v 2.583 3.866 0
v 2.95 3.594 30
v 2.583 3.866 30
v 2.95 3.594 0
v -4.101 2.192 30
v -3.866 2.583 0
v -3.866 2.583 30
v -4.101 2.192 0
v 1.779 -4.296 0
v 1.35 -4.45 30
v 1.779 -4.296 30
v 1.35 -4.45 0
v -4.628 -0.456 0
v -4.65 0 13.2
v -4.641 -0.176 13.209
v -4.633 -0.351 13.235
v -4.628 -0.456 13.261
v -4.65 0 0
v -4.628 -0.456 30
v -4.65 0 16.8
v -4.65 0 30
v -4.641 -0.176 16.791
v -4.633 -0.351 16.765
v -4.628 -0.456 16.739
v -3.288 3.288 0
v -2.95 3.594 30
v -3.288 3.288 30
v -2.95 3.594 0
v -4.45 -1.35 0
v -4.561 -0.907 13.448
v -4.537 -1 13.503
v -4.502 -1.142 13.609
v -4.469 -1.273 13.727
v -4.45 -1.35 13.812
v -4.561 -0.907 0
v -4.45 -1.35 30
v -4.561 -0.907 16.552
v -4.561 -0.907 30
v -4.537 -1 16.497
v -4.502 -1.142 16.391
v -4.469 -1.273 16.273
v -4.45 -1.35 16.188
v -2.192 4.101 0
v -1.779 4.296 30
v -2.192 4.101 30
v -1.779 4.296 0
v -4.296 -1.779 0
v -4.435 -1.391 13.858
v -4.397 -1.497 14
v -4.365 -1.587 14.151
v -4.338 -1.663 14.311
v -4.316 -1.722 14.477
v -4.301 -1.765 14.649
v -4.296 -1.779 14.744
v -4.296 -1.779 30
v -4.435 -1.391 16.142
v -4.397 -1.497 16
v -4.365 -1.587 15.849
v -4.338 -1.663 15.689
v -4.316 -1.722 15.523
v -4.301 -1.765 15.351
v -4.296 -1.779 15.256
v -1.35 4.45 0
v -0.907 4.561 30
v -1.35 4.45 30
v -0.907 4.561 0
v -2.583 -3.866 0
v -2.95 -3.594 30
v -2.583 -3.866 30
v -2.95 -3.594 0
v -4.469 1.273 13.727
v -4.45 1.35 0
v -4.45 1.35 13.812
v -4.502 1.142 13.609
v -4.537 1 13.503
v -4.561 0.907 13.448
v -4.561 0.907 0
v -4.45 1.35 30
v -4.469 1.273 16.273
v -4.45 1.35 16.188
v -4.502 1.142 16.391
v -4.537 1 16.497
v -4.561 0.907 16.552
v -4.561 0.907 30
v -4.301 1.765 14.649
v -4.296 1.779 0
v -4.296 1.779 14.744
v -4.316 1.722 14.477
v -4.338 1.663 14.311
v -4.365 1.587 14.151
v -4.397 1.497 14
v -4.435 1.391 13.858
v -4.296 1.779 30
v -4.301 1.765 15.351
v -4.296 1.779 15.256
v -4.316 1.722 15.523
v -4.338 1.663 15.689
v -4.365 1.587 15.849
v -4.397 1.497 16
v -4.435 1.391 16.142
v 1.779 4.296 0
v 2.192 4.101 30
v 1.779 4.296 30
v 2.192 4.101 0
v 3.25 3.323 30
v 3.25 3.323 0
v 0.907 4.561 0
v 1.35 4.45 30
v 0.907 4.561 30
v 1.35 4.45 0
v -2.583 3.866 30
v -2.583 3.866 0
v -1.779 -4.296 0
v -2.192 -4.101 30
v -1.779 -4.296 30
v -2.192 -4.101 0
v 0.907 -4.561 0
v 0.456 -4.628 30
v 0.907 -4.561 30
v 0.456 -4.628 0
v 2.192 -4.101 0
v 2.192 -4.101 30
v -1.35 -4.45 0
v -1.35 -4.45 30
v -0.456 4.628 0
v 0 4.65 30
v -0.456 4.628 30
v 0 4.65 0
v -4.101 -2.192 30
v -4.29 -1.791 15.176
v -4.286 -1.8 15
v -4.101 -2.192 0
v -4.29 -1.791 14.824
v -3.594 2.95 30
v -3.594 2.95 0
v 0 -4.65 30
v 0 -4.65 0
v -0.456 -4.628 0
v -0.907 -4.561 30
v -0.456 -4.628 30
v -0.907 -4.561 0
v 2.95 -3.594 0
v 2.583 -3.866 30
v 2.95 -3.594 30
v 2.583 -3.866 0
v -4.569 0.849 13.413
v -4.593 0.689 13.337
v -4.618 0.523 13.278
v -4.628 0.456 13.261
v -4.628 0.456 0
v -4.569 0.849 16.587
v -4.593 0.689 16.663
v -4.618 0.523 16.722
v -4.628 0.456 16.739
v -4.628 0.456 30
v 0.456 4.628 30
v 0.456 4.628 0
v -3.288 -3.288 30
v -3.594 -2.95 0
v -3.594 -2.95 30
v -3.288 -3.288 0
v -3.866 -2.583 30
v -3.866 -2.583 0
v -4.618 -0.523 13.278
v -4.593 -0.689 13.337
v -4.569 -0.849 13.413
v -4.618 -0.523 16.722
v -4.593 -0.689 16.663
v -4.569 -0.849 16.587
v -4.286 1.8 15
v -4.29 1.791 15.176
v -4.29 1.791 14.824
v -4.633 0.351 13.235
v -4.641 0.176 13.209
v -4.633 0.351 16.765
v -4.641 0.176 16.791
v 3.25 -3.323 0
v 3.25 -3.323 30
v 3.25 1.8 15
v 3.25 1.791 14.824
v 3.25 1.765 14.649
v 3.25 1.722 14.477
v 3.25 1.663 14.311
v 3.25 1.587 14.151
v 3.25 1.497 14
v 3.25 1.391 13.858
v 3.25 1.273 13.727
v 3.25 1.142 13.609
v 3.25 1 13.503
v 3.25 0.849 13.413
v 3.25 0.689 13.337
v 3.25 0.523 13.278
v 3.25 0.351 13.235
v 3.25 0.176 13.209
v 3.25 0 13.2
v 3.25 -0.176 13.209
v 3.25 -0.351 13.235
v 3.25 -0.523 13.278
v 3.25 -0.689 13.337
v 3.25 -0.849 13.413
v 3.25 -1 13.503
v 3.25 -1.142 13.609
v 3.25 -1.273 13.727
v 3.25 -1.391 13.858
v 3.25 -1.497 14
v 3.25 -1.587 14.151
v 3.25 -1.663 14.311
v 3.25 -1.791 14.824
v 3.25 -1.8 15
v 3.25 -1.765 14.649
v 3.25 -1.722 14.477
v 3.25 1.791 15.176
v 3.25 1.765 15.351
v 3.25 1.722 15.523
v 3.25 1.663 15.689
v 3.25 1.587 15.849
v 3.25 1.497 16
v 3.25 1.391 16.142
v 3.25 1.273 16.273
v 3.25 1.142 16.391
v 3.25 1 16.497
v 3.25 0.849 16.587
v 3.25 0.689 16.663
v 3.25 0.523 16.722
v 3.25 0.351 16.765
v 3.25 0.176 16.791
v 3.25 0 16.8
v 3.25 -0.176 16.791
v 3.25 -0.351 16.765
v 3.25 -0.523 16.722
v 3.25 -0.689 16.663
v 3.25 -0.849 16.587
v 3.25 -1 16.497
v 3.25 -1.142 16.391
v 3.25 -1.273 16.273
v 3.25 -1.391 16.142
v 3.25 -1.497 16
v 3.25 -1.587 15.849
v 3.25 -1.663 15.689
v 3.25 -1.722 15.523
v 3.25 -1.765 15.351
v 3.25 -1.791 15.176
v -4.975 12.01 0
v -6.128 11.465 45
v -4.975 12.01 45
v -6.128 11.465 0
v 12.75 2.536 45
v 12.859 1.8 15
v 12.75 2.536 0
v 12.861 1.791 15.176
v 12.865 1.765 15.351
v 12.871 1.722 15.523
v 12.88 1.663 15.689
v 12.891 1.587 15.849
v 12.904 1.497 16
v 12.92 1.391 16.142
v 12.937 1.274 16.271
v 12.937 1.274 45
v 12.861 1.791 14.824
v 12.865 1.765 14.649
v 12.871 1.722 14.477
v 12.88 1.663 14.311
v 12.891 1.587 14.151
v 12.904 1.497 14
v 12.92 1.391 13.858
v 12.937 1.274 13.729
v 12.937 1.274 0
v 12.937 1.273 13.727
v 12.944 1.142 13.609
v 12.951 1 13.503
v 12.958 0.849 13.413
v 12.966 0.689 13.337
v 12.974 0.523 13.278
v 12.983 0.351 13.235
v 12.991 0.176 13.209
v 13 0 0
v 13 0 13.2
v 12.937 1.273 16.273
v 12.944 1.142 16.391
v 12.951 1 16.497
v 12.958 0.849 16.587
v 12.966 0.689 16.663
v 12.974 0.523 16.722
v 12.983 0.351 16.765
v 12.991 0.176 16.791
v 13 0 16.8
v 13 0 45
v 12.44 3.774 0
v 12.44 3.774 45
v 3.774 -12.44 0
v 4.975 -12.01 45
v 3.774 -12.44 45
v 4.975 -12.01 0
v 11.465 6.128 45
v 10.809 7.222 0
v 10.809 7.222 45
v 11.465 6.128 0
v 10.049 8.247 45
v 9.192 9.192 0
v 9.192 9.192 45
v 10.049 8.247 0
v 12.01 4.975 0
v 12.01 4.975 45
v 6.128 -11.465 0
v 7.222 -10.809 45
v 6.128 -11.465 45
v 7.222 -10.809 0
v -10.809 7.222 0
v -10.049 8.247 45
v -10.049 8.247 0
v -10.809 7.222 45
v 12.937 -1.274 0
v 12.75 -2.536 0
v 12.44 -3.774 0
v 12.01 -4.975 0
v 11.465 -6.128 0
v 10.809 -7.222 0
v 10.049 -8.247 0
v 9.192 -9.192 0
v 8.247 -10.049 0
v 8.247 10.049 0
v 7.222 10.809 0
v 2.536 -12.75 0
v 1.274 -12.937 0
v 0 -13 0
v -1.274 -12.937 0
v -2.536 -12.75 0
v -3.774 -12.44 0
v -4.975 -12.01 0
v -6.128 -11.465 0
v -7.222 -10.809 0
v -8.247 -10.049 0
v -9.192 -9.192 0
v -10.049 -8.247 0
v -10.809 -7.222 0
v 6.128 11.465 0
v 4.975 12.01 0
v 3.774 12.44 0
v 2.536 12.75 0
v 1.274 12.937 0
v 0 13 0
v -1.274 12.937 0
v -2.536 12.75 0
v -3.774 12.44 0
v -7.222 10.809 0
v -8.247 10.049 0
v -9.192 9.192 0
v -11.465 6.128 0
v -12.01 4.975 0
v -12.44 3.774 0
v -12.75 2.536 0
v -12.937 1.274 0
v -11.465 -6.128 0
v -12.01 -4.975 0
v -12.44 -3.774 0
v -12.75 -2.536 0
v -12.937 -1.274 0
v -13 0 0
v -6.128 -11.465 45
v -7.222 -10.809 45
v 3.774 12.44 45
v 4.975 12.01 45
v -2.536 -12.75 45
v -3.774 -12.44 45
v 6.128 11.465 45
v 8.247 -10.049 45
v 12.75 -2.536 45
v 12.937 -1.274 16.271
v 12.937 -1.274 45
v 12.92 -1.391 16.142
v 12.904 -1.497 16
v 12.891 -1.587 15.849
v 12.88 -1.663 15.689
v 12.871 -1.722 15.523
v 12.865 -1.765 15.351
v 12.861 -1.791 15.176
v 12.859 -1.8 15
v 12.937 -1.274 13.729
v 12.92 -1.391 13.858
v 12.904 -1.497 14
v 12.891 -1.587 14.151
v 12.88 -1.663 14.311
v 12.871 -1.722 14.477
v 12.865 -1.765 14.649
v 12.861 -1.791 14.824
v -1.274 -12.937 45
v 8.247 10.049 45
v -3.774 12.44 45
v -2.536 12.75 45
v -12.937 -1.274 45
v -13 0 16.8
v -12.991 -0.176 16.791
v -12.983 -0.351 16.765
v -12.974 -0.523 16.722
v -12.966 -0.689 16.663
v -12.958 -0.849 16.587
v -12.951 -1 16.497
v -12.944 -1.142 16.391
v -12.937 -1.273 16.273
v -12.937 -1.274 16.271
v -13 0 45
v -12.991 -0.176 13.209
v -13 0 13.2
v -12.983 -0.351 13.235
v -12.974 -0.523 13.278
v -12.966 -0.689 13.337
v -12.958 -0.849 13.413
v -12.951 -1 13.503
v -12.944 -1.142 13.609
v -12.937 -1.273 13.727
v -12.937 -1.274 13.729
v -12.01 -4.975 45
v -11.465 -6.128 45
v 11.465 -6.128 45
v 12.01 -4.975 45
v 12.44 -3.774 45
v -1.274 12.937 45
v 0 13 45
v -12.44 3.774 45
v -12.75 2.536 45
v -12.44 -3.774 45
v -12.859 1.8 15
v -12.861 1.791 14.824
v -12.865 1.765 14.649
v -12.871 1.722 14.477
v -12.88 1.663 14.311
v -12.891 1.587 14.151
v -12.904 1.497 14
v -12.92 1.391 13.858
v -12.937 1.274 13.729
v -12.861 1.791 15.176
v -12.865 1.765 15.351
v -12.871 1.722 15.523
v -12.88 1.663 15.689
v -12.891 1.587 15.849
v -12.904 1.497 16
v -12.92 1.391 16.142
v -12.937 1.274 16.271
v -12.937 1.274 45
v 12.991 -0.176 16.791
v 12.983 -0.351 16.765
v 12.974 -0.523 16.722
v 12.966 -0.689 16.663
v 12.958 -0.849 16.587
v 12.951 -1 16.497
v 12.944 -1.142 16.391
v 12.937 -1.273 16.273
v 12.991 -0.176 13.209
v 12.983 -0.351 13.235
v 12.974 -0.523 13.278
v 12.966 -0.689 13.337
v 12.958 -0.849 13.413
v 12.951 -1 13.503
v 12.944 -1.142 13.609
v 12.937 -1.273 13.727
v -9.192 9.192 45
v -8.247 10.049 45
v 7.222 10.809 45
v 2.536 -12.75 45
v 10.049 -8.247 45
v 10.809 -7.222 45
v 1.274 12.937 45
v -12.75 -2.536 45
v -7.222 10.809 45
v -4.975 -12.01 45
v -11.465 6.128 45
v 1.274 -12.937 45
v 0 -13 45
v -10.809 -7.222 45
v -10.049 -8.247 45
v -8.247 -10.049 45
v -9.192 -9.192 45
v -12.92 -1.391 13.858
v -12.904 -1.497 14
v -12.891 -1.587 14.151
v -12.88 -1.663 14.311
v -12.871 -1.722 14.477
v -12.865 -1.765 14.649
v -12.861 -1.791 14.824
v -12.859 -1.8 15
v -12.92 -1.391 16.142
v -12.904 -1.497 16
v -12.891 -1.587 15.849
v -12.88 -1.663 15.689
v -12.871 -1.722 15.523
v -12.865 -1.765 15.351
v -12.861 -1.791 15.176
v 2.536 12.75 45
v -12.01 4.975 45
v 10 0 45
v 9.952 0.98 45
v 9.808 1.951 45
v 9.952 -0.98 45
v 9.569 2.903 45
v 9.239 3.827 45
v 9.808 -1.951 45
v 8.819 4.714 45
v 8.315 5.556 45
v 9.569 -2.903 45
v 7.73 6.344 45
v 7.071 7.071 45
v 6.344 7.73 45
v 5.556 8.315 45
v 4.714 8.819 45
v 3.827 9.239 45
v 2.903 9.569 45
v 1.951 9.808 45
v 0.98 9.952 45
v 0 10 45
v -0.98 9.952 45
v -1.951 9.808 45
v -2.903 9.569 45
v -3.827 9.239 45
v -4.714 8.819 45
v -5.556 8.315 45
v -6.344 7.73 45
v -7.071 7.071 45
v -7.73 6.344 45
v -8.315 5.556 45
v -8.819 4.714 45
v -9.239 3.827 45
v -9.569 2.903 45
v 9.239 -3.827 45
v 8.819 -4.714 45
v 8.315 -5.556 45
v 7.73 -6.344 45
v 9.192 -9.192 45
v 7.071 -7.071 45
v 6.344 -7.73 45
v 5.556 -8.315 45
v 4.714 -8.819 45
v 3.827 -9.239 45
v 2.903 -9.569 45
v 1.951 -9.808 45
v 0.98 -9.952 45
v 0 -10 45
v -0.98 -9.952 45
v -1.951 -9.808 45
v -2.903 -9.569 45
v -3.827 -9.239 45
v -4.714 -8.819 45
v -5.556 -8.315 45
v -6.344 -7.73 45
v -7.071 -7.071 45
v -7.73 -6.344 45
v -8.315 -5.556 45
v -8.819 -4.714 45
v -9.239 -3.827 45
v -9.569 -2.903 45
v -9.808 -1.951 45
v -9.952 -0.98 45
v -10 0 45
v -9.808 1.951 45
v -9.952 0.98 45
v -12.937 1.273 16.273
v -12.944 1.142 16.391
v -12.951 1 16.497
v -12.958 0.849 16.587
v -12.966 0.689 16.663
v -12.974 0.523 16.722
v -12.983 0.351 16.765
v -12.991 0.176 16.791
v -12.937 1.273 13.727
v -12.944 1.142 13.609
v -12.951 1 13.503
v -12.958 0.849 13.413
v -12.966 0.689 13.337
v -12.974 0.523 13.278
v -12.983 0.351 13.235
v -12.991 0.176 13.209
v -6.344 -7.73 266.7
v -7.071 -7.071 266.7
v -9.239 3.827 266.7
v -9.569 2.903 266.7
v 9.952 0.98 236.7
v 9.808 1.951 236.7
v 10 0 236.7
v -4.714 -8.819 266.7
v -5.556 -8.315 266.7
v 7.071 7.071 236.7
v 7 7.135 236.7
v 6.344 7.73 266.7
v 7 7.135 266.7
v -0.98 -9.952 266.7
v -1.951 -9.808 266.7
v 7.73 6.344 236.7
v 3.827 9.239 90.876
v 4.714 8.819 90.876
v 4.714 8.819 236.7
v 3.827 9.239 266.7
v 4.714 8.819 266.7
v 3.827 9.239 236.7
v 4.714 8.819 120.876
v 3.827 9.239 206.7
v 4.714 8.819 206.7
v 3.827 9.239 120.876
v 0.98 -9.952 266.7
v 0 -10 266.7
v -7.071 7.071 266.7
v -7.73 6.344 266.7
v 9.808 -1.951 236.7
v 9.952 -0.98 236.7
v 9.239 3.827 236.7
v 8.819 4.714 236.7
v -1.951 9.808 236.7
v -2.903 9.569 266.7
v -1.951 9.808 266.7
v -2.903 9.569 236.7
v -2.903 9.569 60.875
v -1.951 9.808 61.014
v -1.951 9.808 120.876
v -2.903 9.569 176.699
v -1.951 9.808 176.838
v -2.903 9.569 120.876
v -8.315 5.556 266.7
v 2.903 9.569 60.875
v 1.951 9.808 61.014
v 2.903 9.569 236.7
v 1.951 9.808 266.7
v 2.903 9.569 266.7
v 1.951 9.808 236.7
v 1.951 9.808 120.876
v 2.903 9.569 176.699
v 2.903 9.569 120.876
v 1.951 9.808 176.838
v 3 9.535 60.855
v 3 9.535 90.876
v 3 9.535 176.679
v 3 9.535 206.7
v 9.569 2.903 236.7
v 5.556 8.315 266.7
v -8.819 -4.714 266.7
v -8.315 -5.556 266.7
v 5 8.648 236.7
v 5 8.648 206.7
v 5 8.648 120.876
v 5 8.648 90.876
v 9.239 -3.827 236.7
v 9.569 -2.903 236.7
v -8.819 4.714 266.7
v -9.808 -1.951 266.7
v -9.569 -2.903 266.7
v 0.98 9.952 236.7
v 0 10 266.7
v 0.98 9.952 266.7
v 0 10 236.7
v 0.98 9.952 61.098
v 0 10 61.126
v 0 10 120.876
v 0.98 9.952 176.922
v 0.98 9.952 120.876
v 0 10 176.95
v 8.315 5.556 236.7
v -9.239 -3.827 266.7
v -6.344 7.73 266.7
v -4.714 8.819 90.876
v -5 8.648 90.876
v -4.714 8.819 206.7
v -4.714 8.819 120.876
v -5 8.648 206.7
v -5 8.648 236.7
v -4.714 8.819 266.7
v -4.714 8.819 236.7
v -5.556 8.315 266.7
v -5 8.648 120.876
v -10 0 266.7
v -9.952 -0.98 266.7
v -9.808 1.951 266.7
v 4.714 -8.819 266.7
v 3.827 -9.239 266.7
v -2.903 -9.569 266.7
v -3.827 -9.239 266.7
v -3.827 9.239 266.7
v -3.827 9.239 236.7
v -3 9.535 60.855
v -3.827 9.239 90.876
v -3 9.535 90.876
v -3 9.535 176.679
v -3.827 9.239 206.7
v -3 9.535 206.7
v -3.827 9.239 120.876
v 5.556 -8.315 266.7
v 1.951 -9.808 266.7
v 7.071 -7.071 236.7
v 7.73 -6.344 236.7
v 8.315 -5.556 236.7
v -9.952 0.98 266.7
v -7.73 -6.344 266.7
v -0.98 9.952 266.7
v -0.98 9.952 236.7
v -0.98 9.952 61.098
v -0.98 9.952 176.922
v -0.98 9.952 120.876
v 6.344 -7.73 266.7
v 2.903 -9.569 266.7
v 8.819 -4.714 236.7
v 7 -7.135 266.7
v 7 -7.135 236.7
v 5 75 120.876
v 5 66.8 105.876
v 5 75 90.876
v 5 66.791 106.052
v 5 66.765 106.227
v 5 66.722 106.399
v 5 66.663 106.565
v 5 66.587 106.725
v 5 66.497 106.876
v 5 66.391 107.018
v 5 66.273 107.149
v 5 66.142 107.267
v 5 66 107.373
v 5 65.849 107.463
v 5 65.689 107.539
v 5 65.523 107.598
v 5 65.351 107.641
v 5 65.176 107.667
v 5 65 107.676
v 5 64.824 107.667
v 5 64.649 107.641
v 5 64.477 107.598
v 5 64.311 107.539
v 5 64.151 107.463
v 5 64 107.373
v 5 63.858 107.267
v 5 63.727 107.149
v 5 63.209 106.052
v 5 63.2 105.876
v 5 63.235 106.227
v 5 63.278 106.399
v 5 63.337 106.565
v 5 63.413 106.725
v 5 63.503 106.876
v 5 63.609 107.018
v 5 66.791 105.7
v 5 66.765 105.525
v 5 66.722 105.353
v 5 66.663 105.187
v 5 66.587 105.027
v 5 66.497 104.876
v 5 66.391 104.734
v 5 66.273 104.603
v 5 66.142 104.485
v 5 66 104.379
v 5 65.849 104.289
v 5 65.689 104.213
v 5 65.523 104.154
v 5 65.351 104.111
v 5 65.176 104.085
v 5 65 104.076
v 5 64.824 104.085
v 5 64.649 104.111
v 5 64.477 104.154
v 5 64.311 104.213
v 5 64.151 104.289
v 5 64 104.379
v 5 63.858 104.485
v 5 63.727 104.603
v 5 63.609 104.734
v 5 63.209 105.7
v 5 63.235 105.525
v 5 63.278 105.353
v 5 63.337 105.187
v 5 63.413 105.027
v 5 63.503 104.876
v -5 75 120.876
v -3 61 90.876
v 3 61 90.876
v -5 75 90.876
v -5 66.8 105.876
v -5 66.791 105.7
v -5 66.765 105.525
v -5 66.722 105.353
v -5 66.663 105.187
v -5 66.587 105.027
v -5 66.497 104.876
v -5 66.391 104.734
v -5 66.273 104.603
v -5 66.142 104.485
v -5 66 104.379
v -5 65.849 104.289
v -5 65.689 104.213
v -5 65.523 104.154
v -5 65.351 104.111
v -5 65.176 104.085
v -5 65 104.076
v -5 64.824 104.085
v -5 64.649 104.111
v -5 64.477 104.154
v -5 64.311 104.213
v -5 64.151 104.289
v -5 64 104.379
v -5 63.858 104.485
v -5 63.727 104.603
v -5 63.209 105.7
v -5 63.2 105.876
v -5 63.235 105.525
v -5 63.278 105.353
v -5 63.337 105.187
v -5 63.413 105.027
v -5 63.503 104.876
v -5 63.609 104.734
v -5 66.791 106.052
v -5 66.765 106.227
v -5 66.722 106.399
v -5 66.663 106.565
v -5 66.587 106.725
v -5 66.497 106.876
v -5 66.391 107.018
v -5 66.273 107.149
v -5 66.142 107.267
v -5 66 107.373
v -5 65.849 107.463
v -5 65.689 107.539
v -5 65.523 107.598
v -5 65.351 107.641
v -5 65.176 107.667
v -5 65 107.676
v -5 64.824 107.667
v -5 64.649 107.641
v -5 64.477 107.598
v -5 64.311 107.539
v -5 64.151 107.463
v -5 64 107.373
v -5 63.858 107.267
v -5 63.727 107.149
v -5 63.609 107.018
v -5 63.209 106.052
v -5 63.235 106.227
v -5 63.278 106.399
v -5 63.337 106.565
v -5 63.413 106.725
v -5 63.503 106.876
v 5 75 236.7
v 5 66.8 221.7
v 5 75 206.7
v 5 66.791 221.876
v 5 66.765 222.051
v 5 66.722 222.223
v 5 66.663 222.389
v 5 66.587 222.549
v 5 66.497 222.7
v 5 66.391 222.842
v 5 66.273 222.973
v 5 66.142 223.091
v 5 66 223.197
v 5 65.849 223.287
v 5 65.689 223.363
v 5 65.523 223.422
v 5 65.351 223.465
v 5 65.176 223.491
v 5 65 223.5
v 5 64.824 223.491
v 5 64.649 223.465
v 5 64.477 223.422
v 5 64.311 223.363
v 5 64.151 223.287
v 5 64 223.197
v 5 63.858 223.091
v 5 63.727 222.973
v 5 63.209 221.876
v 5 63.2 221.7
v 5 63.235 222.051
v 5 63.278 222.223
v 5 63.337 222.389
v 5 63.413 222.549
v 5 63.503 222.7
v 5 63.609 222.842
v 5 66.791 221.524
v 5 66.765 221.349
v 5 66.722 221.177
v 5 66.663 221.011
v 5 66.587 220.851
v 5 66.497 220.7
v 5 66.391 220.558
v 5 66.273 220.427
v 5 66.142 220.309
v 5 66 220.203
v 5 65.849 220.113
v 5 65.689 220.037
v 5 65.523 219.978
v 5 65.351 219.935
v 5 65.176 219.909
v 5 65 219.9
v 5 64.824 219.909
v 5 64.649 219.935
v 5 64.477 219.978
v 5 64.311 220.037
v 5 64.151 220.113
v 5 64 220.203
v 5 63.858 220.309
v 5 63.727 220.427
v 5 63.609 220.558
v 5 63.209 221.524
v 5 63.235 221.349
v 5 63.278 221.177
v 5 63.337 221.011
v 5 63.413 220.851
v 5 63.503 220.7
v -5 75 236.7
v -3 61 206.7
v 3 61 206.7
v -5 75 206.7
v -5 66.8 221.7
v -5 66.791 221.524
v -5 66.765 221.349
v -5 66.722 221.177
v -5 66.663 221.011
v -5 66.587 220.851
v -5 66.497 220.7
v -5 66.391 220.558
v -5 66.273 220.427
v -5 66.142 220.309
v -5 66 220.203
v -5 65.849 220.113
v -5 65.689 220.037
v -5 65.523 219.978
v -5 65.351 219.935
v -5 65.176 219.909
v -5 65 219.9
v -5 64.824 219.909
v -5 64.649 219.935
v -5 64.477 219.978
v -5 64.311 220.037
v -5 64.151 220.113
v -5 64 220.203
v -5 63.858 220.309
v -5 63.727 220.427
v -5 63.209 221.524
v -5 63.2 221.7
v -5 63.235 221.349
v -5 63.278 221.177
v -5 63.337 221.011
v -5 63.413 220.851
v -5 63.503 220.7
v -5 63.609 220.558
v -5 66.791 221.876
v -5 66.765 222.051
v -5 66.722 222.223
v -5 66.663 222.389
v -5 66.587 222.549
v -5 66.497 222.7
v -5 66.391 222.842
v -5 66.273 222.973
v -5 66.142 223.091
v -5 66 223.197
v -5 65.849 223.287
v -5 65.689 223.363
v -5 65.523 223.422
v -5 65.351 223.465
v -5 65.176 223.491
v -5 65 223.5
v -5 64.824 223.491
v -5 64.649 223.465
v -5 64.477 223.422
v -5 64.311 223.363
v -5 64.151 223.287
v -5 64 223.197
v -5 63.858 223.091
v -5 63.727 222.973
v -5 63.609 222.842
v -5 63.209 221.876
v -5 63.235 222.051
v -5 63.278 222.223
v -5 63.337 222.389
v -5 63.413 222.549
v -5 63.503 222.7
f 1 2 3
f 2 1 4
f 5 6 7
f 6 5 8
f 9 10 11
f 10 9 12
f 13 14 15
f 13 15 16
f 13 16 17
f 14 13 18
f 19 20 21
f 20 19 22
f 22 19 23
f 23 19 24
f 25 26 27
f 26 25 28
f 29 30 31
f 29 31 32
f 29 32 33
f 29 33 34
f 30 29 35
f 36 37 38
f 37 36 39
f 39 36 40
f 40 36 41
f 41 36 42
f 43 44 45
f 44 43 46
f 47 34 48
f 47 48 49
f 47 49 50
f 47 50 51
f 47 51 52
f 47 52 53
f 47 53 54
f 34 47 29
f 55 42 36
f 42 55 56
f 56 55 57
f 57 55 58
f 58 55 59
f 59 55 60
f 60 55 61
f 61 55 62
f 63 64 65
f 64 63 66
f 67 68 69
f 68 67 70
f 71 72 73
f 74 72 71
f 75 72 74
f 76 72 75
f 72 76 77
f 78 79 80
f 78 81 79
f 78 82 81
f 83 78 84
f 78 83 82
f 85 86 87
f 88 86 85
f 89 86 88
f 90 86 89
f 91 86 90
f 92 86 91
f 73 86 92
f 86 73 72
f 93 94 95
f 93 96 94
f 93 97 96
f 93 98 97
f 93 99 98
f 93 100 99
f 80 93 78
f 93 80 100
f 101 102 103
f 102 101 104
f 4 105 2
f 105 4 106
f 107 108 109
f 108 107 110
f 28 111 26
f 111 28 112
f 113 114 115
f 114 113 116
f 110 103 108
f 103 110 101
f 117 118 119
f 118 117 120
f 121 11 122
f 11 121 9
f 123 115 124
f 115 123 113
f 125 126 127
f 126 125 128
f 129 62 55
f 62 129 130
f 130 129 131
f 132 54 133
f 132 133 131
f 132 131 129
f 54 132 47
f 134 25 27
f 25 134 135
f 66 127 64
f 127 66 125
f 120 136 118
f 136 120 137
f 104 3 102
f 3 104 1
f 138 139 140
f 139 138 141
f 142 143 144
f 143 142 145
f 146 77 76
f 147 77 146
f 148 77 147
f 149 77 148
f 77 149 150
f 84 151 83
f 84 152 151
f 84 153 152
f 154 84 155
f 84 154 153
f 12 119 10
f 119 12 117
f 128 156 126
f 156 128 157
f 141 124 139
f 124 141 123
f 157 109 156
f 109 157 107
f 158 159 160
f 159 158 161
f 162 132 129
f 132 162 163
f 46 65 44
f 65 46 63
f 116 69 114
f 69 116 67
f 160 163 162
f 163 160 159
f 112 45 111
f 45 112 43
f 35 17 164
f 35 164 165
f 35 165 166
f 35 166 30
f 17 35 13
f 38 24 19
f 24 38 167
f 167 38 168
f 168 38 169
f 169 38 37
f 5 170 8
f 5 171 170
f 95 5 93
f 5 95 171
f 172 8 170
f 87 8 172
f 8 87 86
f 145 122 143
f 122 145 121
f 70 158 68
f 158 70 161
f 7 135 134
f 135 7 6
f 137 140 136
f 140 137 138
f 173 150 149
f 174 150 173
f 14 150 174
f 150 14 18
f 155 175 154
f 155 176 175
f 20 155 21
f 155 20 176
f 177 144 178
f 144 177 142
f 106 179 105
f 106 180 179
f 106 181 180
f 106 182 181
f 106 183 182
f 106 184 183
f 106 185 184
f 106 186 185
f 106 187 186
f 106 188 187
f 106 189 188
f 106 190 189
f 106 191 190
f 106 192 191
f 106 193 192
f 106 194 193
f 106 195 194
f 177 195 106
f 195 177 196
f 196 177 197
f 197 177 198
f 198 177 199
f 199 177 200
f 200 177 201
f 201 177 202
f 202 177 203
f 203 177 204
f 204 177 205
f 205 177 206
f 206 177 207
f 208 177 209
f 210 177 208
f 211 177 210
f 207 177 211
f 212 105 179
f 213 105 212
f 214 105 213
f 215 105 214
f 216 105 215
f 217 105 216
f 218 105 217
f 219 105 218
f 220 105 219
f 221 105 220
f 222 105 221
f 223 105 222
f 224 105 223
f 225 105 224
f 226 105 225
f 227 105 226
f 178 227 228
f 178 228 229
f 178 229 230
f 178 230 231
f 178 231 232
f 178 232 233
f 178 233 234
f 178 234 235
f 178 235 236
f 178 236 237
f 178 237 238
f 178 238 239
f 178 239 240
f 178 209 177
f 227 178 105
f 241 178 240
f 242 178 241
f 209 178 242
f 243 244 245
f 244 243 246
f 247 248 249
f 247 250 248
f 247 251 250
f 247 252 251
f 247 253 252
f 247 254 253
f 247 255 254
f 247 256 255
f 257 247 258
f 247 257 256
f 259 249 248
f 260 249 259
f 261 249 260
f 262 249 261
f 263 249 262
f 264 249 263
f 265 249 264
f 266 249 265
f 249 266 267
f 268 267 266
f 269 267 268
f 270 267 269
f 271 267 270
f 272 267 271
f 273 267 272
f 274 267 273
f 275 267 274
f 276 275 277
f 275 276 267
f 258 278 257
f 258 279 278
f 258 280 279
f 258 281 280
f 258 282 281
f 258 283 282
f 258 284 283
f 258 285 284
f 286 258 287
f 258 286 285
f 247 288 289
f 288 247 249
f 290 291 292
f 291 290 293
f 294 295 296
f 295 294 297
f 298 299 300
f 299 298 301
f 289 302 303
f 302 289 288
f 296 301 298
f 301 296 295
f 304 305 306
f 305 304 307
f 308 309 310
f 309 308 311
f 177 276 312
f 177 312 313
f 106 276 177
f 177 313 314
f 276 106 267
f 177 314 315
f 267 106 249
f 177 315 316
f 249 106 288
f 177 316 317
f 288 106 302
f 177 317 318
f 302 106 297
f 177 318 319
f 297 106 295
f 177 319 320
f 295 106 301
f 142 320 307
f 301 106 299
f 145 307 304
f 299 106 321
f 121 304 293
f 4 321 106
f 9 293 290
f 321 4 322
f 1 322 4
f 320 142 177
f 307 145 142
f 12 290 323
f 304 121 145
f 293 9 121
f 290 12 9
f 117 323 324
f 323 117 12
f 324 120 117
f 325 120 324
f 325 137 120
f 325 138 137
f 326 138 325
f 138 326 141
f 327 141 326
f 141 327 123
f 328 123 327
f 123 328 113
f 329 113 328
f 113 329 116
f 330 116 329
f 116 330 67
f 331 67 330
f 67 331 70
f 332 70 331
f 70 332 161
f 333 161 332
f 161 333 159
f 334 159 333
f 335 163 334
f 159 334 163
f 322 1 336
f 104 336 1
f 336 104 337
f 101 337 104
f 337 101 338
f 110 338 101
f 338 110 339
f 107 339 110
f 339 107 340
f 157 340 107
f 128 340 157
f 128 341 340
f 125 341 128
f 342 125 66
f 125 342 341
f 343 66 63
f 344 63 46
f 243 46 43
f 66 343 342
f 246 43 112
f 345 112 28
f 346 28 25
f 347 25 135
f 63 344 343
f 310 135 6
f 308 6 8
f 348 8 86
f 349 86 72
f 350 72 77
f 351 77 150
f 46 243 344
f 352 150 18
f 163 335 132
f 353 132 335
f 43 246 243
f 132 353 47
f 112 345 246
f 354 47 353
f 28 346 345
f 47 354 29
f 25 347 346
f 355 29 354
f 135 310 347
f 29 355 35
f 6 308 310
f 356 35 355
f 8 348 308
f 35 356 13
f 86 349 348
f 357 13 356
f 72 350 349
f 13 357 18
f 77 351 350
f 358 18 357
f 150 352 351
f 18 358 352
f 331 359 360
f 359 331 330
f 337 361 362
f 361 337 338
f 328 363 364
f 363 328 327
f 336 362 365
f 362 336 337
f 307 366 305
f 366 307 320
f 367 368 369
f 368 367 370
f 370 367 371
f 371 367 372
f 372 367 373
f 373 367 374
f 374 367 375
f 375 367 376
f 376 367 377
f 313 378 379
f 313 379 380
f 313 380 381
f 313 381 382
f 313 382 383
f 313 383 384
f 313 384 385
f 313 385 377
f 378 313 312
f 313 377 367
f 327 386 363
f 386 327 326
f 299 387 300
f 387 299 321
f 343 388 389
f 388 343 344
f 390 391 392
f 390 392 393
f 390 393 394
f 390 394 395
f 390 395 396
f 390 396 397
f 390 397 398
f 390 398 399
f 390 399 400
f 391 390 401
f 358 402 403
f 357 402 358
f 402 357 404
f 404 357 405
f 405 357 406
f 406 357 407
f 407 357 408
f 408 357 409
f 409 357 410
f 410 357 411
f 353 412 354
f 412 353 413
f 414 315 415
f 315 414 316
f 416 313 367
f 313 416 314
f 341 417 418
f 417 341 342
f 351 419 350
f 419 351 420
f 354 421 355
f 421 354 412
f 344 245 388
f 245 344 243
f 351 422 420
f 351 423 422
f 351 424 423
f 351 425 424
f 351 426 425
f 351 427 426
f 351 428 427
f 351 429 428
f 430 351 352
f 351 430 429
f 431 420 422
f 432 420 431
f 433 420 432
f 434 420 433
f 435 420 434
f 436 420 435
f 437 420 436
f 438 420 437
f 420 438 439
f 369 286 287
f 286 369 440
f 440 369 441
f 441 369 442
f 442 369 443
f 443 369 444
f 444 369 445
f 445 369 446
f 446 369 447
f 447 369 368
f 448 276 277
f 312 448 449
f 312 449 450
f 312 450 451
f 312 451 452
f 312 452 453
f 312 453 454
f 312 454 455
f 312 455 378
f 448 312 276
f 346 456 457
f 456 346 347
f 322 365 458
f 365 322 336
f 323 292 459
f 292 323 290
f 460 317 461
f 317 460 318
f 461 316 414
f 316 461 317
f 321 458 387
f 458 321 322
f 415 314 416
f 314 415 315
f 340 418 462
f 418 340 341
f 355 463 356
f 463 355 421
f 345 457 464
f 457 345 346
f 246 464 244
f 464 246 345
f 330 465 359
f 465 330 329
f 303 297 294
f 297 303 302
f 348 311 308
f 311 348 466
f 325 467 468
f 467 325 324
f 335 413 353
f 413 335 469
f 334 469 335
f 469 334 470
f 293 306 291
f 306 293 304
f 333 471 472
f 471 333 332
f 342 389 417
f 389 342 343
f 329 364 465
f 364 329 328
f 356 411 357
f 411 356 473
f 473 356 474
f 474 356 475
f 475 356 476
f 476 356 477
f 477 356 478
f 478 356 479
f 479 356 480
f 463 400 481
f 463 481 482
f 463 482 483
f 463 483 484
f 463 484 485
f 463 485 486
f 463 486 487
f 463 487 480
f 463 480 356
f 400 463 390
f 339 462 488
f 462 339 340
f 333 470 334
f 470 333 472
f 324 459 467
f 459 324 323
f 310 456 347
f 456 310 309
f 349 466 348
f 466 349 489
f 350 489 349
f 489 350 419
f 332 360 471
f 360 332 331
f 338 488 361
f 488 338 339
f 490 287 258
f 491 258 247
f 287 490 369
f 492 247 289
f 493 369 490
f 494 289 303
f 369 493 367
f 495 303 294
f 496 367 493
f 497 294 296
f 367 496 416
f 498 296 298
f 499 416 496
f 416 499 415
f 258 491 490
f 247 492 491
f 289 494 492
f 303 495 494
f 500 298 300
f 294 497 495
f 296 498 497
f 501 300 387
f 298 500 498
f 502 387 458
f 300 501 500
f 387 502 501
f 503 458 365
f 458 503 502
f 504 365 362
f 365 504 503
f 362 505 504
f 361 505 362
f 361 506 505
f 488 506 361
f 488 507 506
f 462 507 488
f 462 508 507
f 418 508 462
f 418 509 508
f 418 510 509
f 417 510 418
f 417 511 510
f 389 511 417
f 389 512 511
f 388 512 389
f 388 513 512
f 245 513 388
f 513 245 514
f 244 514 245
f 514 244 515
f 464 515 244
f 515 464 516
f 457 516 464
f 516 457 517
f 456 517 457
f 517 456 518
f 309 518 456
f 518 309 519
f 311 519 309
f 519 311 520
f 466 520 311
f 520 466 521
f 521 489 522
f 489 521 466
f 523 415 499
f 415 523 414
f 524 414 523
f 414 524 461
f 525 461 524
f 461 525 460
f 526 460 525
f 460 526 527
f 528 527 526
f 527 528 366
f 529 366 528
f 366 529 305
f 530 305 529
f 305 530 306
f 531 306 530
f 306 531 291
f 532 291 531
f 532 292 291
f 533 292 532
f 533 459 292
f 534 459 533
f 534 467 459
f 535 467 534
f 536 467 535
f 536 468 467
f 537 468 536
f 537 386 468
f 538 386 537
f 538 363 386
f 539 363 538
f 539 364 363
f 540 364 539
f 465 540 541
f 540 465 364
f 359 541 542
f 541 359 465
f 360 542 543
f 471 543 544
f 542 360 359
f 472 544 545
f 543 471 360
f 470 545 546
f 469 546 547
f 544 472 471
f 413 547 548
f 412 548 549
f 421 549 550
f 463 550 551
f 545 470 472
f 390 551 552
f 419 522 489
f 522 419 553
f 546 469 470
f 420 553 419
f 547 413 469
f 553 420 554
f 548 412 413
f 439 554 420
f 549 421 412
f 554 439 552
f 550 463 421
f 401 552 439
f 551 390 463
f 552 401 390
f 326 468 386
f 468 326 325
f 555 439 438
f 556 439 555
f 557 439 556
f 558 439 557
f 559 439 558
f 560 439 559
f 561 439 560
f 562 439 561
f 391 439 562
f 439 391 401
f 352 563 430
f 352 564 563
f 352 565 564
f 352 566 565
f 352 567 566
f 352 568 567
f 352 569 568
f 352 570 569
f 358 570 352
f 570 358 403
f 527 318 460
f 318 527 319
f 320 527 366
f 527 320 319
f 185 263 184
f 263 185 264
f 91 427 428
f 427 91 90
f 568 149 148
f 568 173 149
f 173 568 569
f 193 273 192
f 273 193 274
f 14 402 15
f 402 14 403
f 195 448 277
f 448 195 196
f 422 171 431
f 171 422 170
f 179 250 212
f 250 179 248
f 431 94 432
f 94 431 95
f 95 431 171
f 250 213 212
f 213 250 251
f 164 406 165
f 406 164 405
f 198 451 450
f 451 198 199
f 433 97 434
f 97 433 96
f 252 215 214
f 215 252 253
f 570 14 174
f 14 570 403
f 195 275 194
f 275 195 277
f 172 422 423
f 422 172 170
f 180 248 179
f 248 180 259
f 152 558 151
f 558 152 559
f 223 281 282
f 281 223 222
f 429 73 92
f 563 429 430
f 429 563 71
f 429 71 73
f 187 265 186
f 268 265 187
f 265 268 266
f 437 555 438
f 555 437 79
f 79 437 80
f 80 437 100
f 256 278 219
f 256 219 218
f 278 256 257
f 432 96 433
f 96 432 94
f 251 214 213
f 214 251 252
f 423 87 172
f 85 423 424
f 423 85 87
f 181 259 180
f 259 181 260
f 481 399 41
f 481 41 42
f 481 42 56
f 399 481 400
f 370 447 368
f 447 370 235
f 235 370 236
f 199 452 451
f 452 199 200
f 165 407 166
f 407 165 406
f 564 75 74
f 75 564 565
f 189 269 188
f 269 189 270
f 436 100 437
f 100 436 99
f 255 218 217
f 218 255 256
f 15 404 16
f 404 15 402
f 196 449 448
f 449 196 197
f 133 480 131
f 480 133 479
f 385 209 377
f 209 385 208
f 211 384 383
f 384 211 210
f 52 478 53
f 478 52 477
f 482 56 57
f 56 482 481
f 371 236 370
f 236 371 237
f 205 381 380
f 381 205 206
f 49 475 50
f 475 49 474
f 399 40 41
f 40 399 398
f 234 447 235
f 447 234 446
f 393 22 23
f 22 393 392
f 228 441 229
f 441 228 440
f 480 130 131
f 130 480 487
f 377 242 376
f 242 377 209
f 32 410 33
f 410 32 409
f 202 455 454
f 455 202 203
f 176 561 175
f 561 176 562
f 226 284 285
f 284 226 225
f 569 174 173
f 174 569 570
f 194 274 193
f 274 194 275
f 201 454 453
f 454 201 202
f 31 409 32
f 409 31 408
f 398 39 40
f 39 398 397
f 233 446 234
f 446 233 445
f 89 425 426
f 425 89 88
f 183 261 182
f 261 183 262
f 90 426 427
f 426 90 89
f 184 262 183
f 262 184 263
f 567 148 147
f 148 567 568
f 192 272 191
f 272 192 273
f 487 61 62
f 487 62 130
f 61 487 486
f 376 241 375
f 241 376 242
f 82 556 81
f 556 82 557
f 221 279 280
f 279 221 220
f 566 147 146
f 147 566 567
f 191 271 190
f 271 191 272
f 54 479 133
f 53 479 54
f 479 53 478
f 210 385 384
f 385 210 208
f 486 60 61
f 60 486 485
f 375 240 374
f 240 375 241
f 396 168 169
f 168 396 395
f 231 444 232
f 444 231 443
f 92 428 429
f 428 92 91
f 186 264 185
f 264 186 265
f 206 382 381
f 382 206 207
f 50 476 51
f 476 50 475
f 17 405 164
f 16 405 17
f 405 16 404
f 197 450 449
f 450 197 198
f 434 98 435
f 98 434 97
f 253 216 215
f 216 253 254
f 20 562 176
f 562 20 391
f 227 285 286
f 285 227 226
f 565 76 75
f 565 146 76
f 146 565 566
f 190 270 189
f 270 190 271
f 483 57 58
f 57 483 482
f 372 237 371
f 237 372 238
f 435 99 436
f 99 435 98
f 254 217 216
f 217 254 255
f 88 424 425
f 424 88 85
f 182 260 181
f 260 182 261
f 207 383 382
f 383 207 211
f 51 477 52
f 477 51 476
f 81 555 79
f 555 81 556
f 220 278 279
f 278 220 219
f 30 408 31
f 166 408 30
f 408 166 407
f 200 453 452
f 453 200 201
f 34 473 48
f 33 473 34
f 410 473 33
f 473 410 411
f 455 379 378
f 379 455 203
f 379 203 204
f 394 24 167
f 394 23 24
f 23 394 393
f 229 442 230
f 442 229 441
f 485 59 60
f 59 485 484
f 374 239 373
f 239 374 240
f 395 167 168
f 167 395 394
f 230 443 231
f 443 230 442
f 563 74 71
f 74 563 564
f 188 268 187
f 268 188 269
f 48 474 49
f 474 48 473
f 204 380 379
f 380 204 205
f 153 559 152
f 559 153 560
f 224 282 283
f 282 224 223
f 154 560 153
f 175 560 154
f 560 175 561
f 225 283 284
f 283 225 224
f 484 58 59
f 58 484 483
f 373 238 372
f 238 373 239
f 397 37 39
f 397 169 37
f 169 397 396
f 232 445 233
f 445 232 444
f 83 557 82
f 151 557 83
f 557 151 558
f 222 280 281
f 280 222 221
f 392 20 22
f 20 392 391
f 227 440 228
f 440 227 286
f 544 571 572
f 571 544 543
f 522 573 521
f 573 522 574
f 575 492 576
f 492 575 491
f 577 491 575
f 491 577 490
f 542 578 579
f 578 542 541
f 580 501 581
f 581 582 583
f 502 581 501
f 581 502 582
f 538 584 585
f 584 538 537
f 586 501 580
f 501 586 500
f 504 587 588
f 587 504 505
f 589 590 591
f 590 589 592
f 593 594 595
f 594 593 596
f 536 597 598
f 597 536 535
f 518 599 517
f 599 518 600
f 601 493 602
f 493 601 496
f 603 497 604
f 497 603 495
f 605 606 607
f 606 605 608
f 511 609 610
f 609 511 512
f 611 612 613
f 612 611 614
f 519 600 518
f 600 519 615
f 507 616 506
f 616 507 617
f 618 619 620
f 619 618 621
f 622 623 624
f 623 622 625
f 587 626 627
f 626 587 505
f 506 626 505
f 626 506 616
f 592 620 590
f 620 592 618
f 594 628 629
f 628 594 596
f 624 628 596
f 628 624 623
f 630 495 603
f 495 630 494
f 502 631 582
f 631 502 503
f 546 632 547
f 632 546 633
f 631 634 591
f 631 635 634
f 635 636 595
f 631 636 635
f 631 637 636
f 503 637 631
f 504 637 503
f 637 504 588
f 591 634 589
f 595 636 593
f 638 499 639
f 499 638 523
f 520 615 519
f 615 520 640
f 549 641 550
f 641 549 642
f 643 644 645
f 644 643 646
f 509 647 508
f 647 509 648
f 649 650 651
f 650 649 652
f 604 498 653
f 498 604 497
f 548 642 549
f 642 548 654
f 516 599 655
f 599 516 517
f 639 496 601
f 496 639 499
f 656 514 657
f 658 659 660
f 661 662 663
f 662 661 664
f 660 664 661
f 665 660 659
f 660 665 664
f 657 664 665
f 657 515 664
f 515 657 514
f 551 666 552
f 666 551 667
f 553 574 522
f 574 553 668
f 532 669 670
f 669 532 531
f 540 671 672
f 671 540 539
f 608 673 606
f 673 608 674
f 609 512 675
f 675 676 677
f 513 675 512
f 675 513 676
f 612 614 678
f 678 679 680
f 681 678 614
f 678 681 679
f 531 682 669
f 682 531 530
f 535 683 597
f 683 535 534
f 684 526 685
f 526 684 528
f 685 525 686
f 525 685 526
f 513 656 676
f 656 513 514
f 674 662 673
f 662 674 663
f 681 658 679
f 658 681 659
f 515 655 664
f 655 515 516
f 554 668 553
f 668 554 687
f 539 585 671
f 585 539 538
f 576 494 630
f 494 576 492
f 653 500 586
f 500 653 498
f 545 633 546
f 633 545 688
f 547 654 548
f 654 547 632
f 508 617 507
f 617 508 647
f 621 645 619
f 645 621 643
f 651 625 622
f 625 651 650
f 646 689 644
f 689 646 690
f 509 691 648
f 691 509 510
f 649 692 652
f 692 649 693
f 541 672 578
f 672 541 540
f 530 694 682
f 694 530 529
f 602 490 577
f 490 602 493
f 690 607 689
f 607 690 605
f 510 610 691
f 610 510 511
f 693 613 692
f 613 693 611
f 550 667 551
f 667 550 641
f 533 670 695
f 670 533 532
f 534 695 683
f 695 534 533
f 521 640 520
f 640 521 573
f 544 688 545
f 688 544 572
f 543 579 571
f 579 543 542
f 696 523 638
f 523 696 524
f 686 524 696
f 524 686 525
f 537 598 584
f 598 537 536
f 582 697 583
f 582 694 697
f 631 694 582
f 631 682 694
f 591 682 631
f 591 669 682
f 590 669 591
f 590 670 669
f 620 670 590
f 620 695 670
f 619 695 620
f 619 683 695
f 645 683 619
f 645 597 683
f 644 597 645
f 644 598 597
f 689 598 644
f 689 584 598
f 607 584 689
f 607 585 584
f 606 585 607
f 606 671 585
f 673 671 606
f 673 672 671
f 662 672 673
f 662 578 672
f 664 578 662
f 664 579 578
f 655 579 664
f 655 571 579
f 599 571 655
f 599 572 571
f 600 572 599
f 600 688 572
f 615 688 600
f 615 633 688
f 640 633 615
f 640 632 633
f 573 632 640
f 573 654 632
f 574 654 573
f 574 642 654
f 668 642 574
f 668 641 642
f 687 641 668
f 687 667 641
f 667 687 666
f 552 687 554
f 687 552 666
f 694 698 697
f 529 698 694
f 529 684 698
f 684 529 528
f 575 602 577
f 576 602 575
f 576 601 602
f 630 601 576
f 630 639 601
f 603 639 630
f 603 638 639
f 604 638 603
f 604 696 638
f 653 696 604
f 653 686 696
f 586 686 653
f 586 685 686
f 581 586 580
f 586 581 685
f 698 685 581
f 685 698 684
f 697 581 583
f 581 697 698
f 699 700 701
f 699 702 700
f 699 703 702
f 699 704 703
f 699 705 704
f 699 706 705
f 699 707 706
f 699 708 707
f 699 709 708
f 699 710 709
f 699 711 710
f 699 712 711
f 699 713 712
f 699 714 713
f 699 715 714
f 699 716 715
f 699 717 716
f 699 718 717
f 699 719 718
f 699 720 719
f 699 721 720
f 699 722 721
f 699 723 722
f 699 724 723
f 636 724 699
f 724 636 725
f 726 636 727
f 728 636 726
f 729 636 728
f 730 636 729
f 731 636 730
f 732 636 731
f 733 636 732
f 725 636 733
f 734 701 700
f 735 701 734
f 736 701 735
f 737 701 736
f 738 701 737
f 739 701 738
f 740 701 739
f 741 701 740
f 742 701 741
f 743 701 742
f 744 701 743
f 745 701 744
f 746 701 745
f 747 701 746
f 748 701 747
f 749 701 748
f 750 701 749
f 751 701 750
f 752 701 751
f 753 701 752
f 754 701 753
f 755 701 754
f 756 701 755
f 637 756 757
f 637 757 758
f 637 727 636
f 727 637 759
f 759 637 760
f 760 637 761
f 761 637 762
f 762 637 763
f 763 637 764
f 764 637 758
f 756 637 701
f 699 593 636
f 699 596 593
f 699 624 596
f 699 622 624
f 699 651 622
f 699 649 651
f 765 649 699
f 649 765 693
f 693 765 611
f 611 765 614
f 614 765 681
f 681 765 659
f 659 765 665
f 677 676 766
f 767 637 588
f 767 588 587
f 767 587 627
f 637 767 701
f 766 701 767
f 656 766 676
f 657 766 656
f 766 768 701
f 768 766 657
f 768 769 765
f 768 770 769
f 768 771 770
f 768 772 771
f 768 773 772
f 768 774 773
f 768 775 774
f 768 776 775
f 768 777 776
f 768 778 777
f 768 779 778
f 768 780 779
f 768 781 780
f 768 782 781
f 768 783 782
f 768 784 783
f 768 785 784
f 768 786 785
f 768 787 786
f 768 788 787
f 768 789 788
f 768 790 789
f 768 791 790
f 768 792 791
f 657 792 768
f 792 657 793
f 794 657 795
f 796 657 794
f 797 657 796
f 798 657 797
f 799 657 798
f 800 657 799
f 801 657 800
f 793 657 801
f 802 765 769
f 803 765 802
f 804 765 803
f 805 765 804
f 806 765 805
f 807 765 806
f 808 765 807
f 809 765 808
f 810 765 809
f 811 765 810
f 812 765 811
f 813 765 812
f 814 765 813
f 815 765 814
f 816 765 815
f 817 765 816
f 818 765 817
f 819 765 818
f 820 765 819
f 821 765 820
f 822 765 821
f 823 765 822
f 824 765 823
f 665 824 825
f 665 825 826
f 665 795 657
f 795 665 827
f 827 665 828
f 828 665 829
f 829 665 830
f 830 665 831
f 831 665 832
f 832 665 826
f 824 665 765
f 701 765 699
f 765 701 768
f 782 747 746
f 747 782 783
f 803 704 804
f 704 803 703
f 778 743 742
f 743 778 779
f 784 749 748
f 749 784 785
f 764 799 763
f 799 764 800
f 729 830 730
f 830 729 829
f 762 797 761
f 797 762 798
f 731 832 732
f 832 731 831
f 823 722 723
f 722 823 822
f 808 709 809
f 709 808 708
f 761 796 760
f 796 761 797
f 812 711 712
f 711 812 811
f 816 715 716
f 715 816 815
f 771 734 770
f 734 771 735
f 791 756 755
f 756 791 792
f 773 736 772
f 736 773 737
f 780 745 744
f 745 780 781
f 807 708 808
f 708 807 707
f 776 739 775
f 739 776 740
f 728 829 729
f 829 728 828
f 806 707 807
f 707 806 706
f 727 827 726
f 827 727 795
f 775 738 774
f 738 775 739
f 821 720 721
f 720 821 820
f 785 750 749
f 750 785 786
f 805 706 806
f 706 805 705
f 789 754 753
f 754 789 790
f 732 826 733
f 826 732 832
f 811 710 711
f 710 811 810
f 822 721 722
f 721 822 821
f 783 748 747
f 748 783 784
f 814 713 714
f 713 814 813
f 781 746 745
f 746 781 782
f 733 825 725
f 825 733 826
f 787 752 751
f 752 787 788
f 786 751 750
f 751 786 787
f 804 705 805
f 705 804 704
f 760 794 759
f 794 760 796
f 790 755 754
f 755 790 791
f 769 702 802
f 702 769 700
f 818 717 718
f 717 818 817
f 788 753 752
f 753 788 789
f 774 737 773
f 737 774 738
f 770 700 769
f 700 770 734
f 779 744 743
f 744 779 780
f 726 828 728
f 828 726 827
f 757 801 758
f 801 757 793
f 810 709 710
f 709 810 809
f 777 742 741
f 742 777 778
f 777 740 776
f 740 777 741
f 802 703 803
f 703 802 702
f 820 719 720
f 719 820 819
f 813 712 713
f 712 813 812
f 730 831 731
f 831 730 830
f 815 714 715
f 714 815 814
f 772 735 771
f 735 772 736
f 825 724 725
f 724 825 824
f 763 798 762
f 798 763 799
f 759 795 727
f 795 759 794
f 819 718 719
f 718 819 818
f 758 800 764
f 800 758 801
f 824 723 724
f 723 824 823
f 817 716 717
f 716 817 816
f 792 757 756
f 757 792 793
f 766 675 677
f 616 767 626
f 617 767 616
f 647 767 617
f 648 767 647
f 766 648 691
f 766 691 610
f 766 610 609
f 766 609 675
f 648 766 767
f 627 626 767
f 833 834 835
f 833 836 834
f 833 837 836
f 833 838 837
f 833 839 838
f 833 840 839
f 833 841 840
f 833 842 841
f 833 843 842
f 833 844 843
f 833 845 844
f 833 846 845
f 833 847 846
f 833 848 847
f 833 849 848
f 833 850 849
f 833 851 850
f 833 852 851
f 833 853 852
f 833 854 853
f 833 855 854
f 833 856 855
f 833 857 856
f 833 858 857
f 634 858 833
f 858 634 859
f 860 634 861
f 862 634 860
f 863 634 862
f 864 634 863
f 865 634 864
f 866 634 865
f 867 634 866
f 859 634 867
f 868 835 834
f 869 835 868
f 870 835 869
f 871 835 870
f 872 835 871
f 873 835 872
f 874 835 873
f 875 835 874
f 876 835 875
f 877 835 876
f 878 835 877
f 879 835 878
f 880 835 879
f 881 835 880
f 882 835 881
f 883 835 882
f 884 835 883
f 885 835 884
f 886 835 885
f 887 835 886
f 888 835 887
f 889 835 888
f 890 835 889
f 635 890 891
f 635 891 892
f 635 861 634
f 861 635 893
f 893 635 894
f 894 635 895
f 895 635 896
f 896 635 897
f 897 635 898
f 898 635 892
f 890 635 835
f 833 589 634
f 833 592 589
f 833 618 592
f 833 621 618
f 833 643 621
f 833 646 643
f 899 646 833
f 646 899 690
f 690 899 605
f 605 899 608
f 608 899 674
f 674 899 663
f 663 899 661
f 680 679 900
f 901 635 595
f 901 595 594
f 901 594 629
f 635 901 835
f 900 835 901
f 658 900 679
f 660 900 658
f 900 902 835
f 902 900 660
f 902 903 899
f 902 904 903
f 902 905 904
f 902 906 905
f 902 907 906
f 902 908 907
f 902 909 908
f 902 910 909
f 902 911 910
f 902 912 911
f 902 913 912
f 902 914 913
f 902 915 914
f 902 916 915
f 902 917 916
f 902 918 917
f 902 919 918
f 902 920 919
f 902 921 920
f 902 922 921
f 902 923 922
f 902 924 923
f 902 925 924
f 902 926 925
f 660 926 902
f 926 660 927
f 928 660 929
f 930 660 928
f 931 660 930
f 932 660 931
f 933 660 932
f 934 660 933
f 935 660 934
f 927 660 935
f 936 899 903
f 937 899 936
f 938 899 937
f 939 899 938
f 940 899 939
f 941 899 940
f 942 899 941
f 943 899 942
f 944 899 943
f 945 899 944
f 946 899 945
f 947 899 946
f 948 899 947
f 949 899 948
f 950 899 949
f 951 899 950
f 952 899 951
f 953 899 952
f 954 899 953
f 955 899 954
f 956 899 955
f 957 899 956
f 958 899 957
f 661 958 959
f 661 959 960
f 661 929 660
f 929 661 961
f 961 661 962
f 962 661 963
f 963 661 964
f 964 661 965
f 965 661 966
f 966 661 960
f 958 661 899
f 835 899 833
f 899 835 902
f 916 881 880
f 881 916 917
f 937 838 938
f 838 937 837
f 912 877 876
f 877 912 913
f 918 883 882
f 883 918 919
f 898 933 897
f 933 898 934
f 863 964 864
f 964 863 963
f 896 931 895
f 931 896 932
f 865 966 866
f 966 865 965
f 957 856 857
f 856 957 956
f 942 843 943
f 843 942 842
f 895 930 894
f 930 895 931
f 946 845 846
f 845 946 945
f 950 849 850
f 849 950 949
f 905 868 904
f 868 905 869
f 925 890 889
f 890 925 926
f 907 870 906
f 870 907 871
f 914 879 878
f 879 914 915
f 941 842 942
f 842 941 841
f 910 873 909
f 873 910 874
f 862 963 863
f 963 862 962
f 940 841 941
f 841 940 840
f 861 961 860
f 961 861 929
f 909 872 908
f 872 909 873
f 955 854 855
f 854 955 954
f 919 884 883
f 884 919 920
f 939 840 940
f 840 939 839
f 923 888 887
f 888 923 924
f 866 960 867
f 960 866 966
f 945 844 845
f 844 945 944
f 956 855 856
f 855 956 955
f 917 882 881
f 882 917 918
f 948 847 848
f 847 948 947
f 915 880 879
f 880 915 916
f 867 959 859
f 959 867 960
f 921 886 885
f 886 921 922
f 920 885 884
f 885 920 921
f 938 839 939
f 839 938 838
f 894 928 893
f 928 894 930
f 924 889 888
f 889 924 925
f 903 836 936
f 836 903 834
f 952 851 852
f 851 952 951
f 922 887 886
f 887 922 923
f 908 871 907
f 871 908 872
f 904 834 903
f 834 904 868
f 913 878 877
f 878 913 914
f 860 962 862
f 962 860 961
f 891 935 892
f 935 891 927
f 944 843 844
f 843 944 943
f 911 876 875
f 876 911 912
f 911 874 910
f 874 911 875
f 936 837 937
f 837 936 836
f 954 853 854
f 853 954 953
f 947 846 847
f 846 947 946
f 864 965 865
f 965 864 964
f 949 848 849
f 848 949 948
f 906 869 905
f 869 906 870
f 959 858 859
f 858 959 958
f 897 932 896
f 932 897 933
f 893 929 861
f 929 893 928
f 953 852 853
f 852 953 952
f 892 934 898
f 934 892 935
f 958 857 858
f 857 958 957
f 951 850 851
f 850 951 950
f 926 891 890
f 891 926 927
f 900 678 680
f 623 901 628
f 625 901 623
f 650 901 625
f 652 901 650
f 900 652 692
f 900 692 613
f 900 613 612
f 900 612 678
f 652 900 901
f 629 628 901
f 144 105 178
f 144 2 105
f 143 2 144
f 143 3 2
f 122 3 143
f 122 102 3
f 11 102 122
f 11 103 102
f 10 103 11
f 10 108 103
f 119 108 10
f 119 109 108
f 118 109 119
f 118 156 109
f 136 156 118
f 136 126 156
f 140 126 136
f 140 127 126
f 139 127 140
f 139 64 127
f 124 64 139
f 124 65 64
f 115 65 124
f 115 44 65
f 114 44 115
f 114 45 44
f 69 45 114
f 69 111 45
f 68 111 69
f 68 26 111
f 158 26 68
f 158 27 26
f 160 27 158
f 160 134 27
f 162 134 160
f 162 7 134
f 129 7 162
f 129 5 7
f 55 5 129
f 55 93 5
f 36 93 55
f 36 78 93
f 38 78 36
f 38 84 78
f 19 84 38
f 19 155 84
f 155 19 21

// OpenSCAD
// FILE: Antenna_Mast_With_Top_Key_V9.2.scad
// UPDATED: Added an explicit 0.2mm clearance to the internal socket hole for an easy slide-fit.
// COMPATIBILITY: Links perfectly with your 9.1mm top gear rod section.

$fn = 64; 
mm = 25.4; 

// --- SHAFT & ANTENNA SPECS ---
gear_rod_dia   = 9.1;    // The physical rod diameter it mates with
hole_clearance = 0.2;    // NEW: 0.2mm slip-fit clearance added to the hole diameter
d_slice_depth  = 1.3;    // Maintains the flat interface wall at exactly 3.25mm from center
socket_depth   = 30;     
antenna_h      = 10.5 * mm; 
hole_spacing   = 4.56 * mm; 
hole_dia       = 3.6;    // Sized for standard nominal M3 hardware

// --- GEOMETRY ---
main_rod_dia           = 20; 
base_reinforcement_dia = 26; 
horizontal_reach       = 65; 
arm_height             = 30; 
arm_width              = 10; 
gusset_thick           = 6; 

// --- TOP D-CUT SPECS ---
top_dcut_depth = 3;   // Matches the 3mm flat in the webcam topper
top_dcut_h     = 30;  // Length of the flat at the tip

// --- ARM SLIDE ADJUSTMENT ---
arm_slide_down = 45; 

// ============================================================
// RENDER
// ============================================================
union() {
    // 1. REINFORCED D-SOCKET BASE (Females onto the 9.1mm Gear Rod)
    difference() {
        color("Gold") cylinder(h = socket_depth + 15, d = base_reinforcement_dia); 
        translate([0, 0, -1]) {
            difference() {
                // Main round hole with explicit 0.2mm clearance (Total 9.3mm diameter)
                cylinder(h = socket_depth + 2, d = gear_rod_dia + hole_clearance);
                
                // The D-flat internal mating wall
                translate([gear_rod_dia/2 - d_slice_depth, -gear_rod_dia - 1, 0])
                    cube([gear_rod_dia + 2, (gear_rod_dia * 2) + 2, socket_depth + 5]); 
            }
        }
        // Cross-bolt safety hole
        translate([0, 0, socket_depth / 2]) rotate([0, 90, 0]) 
            cylinder(h = base_reinforcement_dia + 2, d = 3.6, center=true); 
    }

    // 2. THE MAIN VERTICAL MAST (With Top D-Cut)
    color("Gold") translate([0, 0, socket_depth + 15]) {
        difference() {
            cylinder(h = antenna_h - (socket_depth + 15), d = main_rod_dia); 
            
            // THE TOP D-CUT FLAT (For Webcam Topper)
            translate([main_rod_dia/2 - top_dcut_depth, -main_rod_dia, antenna_h - (socket_depth + 15) - top_dcut_h])
                cube([10, main_rod_dia*2, top_dcut_h + 1]);
        }
    }
    
    // Conical transition at base
    color("Gold") translate([0, 0, socket_depth + 15])
        mirror([0,0,1]) cylinder(h=15, d1=base_reinforcement_dia, d2=main_rod_dia); 

    // 3. THE TWO REINFORCED FIN ARMS
    for (z_pos = [antenna_h - hole_spacing - arm_slide_down, antenna_h - arm_slide_down]) { 
        translate([0, 0, z_pos - arm_height/2]) {
            color("Gold") difference() {
                translate([-arm_width/2, 0, 0]) 
                    cube([arm_width, horizontal_reach + 10, arm_height]); 
                translate([-arm_width/2 - 1, horizontal_reach, arm_height/2])
                    rotate([0, 90, 0]) 
                        cylinder(h = arm_width + 2, d = hole_dia); 
            }
            color("Red") 
            translate([-gusset_thick/2, 1, 0]) 
            rotate([90, 0, 90]) 
            linear_extrude(gusset_thick)
            polygon([[0, 0], [0, -35], [horizontal_reach - 5, 0]]); 
        }
    }
}
